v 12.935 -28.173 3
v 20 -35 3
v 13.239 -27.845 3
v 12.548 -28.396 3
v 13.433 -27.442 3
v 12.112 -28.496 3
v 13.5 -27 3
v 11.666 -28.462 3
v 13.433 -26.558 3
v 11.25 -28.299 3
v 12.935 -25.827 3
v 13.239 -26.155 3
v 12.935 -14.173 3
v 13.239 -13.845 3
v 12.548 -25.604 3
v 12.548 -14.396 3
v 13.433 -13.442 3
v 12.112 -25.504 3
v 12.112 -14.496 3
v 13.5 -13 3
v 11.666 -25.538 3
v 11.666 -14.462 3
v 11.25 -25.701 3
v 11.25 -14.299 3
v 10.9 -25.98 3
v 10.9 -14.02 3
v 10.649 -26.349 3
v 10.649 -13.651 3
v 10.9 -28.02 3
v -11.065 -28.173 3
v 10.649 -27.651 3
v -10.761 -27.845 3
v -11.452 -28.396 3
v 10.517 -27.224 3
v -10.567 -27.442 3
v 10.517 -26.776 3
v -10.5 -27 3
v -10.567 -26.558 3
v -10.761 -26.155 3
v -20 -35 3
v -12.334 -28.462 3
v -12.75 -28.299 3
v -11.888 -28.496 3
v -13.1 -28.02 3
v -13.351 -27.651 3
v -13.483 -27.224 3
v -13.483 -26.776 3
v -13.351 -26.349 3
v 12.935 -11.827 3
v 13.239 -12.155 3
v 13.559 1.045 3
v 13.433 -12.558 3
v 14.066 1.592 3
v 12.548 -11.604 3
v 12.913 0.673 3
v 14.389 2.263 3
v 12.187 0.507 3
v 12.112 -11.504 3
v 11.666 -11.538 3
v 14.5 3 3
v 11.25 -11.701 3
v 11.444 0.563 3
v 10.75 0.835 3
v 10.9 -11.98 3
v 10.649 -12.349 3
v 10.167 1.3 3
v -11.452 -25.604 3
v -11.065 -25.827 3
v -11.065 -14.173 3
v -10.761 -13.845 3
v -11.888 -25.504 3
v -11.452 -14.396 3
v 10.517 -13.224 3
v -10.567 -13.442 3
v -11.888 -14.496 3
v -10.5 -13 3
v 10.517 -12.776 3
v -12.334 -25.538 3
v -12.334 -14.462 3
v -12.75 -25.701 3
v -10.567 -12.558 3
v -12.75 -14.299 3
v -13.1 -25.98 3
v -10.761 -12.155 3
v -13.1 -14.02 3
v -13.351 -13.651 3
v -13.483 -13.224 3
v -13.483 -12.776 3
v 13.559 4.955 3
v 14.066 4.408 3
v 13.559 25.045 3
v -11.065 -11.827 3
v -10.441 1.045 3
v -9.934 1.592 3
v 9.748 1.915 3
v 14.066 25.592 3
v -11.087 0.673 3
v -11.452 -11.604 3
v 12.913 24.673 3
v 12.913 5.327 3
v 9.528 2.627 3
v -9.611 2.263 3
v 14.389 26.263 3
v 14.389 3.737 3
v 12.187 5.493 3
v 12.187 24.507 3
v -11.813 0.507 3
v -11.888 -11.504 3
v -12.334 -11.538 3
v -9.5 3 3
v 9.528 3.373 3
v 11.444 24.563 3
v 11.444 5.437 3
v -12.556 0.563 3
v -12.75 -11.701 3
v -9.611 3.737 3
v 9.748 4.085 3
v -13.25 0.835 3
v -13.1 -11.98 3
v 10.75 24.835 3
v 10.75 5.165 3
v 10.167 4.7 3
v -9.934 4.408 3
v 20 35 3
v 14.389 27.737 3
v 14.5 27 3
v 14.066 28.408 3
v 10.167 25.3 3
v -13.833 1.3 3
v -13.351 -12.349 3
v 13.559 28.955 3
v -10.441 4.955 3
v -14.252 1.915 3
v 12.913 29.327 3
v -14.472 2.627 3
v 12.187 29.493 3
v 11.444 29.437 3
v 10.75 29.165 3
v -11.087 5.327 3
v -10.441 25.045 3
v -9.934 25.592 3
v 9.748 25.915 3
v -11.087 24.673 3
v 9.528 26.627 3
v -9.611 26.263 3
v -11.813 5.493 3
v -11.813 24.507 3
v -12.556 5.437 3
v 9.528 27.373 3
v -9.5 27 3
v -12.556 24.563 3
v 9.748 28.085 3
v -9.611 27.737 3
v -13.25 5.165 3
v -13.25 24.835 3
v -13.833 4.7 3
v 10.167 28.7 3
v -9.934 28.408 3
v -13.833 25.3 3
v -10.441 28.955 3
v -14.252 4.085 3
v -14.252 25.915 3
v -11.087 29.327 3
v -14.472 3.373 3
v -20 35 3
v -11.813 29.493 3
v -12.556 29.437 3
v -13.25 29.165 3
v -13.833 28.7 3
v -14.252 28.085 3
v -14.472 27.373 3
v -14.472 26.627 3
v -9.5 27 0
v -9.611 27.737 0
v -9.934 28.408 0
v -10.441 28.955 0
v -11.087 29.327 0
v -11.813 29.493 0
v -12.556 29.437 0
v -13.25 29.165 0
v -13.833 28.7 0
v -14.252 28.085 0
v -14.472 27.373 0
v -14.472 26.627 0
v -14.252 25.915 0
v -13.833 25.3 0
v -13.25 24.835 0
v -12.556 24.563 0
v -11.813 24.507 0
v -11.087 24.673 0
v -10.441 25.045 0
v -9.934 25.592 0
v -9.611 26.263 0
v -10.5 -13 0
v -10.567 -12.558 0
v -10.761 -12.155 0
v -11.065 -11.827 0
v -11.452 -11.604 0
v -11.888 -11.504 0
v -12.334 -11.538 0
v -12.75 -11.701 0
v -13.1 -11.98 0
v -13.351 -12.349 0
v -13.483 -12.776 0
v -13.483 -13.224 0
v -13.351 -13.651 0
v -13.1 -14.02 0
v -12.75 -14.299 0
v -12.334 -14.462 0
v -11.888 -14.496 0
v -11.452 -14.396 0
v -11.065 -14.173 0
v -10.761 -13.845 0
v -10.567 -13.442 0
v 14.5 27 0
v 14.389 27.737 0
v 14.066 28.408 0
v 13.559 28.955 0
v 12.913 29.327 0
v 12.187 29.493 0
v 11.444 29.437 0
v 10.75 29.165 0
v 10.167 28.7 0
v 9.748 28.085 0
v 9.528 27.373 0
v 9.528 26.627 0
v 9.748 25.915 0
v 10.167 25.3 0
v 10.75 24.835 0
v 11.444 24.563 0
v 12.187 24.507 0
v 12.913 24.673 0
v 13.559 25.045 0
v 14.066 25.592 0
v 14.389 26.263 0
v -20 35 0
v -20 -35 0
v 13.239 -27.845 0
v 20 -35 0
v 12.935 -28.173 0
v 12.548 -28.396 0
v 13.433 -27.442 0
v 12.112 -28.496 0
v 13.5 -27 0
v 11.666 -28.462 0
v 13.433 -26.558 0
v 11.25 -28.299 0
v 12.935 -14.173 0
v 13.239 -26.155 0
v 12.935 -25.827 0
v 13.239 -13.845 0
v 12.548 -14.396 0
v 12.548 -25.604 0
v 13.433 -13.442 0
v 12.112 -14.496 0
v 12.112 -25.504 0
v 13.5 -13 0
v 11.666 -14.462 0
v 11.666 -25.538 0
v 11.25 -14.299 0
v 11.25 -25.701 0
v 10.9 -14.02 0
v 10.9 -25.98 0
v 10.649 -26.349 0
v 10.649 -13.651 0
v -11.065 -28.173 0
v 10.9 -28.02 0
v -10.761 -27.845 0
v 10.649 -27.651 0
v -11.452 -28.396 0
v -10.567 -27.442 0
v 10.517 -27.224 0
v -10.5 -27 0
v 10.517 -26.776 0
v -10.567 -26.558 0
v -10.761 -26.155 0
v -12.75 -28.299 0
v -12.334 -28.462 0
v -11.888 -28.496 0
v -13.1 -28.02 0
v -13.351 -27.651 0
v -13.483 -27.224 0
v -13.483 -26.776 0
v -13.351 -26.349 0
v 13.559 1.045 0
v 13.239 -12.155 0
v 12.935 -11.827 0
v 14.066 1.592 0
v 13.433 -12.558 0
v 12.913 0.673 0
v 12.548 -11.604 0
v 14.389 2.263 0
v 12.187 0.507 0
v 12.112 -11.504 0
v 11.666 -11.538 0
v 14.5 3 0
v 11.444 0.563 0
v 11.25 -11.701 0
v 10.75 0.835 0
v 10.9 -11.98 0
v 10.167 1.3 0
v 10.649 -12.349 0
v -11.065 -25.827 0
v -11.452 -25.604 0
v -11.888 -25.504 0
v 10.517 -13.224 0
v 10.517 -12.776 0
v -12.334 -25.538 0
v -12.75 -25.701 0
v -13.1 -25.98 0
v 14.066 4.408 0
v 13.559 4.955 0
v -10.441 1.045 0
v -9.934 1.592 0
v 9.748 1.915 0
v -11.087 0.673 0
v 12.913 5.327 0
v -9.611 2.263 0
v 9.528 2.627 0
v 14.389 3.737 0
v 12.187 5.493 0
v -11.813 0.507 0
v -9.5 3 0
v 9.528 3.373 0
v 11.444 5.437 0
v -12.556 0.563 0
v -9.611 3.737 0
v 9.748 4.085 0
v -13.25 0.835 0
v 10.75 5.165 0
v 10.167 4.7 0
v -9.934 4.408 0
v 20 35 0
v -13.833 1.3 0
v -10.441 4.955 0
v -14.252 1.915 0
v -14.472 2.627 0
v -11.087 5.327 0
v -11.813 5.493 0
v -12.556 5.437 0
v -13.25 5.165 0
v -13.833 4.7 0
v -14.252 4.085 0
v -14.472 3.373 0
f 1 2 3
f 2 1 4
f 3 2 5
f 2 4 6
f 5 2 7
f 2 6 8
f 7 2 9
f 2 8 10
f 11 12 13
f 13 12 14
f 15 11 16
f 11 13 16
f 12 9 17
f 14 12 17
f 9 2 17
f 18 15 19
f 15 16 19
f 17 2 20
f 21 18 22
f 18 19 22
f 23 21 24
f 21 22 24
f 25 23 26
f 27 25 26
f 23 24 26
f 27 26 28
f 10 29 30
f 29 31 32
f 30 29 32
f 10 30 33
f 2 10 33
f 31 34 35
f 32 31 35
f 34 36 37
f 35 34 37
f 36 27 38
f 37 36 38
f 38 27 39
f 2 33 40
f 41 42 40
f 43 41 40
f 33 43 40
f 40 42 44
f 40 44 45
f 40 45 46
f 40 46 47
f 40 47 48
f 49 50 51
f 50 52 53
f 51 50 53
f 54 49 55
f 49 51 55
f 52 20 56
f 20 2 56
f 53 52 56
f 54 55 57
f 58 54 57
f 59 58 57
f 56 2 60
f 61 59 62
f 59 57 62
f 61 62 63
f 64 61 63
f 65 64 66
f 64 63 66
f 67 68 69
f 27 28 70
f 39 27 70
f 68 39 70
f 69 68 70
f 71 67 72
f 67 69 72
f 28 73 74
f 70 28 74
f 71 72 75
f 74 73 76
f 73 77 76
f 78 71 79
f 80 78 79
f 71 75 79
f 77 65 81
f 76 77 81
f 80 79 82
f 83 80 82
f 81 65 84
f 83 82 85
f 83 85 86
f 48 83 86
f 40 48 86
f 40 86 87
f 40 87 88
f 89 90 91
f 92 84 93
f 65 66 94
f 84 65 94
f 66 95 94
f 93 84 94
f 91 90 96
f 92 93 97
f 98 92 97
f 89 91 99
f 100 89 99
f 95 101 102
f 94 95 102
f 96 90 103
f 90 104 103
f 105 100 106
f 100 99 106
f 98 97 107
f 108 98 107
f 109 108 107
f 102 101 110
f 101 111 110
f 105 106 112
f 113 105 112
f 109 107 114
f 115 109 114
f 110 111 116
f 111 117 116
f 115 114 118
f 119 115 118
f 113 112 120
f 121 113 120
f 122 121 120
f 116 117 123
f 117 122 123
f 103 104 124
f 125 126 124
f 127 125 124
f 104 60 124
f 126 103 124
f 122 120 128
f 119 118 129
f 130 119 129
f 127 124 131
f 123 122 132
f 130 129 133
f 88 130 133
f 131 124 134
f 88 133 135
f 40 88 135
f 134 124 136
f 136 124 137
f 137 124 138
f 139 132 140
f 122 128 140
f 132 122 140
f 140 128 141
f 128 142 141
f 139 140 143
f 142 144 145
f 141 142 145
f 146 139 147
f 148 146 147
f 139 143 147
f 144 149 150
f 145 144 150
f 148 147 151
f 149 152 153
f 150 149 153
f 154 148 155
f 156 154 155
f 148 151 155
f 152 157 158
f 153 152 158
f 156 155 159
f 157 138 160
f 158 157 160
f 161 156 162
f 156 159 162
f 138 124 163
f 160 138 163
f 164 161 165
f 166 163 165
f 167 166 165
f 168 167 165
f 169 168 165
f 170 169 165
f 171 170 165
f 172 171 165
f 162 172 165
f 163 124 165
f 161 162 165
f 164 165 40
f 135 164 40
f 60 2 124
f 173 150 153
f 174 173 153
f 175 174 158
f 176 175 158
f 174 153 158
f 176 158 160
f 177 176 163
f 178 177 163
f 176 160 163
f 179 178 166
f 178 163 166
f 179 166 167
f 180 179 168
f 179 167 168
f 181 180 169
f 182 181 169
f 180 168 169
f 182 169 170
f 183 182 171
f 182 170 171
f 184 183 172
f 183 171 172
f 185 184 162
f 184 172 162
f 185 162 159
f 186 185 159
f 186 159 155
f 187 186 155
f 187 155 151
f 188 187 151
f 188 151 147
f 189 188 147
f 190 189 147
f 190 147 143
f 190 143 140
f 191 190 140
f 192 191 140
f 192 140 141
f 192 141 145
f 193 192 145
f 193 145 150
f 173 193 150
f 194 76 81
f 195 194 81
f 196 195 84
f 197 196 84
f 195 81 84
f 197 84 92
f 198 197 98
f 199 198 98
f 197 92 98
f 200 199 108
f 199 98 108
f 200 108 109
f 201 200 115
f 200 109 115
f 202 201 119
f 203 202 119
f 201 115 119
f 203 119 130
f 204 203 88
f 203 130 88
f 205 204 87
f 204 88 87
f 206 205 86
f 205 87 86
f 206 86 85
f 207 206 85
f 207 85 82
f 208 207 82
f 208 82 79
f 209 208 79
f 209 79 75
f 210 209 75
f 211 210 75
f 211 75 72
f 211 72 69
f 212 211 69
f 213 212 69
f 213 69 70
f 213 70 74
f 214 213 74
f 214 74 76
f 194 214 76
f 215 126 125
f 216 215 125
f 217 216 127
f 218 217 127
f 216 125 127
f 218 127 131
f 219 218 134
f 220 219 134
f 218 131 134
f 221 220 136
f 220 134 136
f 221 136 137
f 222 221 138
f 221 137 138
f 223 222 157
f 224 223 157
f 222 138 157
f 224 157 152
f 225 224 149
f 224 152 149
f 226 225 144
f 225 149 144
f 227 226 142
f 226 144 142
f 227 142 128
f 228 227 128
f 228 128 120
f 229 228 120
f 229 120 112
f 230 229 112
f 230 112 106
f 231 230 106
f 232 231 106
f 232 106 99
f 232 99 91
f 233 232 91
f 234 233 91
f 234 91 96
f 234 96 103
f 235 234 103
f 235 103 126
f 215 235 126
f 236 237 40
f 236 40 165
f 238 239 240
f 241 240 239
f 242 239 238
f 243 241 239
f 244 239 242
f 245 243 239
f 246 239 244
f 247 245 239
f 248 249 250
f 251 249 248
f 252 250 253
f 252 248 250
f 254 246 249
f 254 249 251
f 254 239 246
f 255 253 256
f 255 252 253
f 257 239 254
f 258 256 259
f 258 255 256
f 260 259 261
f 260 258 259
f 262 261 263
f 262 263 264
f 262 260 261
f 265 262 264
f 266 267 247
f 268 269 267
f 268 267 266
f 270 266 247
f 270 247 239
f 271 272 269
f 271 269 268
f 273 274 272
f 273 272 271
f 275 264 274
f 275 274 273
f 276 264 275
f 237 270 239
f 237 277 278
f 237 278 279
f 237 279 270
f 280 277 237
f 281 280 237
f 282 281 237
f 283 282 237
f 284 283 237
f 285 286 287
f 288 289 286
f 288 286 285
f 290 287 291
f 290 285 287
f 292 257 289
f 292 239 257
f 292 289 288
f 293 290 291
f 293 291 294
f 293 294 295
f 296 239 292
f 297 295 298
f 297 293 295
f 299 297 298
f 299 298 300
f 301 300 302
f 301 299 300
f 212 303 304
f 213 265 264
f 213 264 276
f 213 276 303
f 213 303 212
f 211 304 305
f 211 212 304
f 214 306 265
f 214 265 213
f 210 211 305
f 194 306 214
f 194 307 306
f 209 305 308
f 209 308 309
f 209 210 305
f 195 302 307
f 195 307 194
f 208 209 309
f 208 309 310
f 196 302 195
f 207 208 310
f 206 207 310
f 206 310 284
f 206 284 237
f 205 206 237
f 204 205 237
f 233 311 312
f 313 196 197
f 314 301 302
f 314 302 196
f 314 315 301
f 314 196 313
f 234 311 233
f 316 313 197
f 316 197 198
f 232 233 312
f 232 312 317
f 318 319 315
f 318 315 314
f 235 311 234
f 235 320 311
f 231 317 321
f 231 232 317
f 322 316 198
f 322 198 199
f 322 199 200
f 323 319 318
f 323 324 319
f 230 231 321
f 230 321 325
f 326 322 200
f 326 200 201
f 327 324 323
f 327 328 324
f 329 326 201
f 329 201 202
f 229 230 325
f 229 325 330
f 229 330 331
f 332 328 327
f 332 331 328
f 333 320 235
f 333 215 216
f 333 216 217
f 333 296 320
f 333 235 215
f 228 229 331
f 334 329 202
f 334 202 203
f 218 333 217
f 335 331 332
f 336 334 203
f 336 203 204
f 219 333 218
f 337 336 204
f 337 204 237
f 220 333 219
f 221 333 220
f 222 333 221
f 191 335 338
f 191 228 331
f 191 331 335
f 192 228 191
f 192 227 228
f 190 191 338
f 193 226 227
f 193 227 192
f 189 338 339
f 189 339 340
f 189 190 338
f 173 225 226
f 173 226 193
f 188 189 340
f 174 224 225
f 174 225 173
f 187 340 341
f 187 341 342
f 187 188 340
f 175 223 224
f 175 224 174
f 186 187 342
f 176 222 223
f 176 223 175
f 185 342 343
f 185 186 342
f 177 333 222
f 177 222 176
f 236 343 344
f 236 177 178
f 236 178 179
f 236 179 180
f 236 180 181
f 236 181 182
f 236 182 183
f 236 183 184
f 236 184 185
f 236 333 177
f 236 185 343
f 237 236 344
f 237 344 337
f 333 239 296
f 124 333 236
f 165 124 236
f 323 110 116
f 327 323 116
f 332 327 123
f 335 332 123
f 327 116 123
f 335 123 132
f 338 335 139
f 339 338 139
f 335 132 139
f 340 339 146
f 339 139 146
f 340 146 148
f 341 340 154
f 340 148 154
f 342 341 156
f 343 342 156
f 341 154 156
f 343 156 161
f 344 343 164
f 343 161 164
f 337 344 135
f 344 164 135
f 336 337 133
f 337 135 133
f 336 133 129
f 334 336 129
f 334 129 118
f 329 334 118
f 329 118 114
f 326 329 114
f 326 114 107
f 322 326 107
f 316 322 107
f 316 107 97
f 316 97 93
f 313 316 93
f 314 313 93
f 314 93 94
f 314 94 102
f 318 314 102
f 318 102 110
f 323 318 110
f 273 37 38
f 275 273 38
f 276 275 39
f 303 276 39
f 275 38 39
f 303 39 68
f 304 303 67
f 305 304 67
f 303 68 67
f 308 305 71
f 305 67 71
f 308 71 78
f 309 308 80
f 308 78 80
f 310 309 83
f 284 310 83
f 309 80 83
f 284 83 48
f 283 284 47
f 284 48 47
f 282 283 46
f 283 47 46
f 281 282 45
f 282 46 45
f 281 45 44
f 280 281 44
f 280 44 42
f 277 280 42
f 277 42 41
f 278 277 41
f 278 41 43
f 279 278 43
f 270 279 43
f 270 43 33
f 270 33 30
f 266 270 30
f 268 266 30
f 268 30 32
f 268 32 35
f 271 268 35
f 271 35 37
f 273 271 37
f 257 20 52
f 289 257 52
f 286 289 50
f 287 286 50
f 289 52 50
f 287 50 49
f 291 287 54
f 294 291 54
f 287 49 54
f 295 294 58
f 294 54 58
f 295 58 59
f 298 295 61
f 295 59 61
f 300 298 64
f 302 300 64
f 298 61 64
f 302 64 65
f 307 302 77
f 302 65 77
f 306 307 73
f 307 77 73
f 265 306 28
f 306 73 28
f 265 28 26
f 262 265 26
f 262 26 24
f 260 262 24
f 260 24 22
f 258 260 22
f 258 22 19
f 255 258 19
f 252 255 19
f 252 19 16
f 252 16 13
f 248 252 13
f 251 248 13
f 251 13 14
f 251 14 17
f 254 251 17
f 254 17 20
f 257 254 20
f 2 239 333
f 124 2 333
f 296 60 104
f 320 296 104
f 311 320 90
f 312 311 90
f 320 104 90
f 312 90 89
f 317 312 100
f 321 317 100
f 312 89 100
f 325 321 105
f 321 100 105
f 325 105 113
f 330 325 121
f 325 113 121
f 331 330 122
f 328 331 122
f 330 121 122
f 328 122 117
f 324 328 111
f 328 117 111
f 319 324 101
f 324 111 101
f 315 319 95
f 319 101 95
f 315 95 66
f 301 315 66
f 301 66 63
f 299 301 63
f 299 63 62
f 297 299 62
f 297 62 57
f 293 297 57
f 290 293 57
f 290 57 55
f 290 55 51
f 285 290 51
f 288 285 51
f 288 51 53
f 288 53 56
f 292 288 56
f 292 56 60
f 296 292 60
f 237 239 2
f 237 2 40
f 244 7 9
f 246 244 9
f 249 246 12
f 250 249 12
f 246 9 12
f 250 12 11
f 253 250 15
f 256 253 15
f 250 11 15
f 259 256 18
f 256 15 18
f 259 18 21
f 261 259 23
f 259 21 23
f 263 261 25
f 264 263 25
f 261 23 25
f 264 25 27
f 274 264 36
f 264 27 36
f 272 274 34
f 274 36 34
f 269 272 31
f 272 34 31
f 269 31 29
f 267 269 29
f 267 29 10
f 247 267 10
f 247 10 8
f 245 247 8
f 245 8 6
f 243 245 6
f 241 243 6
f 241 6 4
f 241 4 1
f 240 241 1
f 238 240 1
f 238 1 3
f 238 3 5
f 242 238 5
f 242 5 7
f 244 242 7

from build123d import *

# Parameters (mm, degrees)
EXTRUDE_1_DEPTH     = 3
SKETCH_2_R          = 1.55
CUT_EXTRUDE_1_DEPTH = 73.862884928
SKETCH_3_R          = 1.5
SKETCH_3_R_2        = 2.5
CUT_EXTRUDE_2_DEPTH = 73.862884928
SKETCH_4_W          = 40
SKETCH_4_H          = 35
CUT_EXTRUDE_3_DEPTH = 73.862884928


with BuildPart() as part:
    # 草图1 → 凸台-拉伸1 (new body)
    with BuildSketch(Plane.XY):
        Polygon((-20, 35), (0, 70), (20, 70), (20, 35), (20, -35), (-20, -35), align=None)
    extrude(amount=EXTRUDE_1_DEPTH)

    # 草图2 → 切除-拉伸1 (cut, through all)
    with BuildSketch(Plane.XY.offset(3)):
        with Locations((17, 61)):
            Circle(SKETCH_2_R)
        with Locations((6, 61)):
            Circle(SKETCH_2_R)
        with Locations((17, 41)):
            Circle(SKETCH_2_R)
        with Locations((4.851224059, 41)):
            Circle(SKETCH_2_R)
    extrude(amount=-CUT_EXTRUDE_1_DEPTH, mode=Mode.SUBTRACT)

    # 草图3 → 切除-拉伸2 (cut, through all)
    with BuildSketch(Plane.XY.offset(3)):
        with Locations((12, -27)):
            Circle(SKETCH_3_R)
        with Locations((-12, -27)):
            Circle(SKETCH_3_R)
        with Locations((12, -13)):
            Circle(SKETCH_3_R)
        with Locations((-12, -13)):
            Circle(SKETCH_3_R)
        with Locations((12, 3)):
            Circle(SKETCH_3_R_2)
        with Locations((-12, 3)):
            Circle(SKETCH_3_R_2)
        with Locations((12, 27)):
            Circle(SKETCH_3_R_2)
        with Locations((-12, 27)):
            Circle(SKETCH_3_R_2)
    extrude(amount=-CUT_EXTRUDE_2_DEPTH, mode=Mode.SUBTRACT)

    # 草图4 → 切除-拉伸3 (cut, through all)
    with BuildSketch(Plane(origin=(0, 0, 0), x_dir=(-1, 0, 0), z_dir=(0, 0, -1))):
        with Locations((0, 52.5)):
            Rectangle(SKETCH_4_W, SKETCH_4_H)
    extrude(amount=-CUT_EXTRUDE_3_DEPTH, mode=Mode.SUBTRACT)


solid = part.part
